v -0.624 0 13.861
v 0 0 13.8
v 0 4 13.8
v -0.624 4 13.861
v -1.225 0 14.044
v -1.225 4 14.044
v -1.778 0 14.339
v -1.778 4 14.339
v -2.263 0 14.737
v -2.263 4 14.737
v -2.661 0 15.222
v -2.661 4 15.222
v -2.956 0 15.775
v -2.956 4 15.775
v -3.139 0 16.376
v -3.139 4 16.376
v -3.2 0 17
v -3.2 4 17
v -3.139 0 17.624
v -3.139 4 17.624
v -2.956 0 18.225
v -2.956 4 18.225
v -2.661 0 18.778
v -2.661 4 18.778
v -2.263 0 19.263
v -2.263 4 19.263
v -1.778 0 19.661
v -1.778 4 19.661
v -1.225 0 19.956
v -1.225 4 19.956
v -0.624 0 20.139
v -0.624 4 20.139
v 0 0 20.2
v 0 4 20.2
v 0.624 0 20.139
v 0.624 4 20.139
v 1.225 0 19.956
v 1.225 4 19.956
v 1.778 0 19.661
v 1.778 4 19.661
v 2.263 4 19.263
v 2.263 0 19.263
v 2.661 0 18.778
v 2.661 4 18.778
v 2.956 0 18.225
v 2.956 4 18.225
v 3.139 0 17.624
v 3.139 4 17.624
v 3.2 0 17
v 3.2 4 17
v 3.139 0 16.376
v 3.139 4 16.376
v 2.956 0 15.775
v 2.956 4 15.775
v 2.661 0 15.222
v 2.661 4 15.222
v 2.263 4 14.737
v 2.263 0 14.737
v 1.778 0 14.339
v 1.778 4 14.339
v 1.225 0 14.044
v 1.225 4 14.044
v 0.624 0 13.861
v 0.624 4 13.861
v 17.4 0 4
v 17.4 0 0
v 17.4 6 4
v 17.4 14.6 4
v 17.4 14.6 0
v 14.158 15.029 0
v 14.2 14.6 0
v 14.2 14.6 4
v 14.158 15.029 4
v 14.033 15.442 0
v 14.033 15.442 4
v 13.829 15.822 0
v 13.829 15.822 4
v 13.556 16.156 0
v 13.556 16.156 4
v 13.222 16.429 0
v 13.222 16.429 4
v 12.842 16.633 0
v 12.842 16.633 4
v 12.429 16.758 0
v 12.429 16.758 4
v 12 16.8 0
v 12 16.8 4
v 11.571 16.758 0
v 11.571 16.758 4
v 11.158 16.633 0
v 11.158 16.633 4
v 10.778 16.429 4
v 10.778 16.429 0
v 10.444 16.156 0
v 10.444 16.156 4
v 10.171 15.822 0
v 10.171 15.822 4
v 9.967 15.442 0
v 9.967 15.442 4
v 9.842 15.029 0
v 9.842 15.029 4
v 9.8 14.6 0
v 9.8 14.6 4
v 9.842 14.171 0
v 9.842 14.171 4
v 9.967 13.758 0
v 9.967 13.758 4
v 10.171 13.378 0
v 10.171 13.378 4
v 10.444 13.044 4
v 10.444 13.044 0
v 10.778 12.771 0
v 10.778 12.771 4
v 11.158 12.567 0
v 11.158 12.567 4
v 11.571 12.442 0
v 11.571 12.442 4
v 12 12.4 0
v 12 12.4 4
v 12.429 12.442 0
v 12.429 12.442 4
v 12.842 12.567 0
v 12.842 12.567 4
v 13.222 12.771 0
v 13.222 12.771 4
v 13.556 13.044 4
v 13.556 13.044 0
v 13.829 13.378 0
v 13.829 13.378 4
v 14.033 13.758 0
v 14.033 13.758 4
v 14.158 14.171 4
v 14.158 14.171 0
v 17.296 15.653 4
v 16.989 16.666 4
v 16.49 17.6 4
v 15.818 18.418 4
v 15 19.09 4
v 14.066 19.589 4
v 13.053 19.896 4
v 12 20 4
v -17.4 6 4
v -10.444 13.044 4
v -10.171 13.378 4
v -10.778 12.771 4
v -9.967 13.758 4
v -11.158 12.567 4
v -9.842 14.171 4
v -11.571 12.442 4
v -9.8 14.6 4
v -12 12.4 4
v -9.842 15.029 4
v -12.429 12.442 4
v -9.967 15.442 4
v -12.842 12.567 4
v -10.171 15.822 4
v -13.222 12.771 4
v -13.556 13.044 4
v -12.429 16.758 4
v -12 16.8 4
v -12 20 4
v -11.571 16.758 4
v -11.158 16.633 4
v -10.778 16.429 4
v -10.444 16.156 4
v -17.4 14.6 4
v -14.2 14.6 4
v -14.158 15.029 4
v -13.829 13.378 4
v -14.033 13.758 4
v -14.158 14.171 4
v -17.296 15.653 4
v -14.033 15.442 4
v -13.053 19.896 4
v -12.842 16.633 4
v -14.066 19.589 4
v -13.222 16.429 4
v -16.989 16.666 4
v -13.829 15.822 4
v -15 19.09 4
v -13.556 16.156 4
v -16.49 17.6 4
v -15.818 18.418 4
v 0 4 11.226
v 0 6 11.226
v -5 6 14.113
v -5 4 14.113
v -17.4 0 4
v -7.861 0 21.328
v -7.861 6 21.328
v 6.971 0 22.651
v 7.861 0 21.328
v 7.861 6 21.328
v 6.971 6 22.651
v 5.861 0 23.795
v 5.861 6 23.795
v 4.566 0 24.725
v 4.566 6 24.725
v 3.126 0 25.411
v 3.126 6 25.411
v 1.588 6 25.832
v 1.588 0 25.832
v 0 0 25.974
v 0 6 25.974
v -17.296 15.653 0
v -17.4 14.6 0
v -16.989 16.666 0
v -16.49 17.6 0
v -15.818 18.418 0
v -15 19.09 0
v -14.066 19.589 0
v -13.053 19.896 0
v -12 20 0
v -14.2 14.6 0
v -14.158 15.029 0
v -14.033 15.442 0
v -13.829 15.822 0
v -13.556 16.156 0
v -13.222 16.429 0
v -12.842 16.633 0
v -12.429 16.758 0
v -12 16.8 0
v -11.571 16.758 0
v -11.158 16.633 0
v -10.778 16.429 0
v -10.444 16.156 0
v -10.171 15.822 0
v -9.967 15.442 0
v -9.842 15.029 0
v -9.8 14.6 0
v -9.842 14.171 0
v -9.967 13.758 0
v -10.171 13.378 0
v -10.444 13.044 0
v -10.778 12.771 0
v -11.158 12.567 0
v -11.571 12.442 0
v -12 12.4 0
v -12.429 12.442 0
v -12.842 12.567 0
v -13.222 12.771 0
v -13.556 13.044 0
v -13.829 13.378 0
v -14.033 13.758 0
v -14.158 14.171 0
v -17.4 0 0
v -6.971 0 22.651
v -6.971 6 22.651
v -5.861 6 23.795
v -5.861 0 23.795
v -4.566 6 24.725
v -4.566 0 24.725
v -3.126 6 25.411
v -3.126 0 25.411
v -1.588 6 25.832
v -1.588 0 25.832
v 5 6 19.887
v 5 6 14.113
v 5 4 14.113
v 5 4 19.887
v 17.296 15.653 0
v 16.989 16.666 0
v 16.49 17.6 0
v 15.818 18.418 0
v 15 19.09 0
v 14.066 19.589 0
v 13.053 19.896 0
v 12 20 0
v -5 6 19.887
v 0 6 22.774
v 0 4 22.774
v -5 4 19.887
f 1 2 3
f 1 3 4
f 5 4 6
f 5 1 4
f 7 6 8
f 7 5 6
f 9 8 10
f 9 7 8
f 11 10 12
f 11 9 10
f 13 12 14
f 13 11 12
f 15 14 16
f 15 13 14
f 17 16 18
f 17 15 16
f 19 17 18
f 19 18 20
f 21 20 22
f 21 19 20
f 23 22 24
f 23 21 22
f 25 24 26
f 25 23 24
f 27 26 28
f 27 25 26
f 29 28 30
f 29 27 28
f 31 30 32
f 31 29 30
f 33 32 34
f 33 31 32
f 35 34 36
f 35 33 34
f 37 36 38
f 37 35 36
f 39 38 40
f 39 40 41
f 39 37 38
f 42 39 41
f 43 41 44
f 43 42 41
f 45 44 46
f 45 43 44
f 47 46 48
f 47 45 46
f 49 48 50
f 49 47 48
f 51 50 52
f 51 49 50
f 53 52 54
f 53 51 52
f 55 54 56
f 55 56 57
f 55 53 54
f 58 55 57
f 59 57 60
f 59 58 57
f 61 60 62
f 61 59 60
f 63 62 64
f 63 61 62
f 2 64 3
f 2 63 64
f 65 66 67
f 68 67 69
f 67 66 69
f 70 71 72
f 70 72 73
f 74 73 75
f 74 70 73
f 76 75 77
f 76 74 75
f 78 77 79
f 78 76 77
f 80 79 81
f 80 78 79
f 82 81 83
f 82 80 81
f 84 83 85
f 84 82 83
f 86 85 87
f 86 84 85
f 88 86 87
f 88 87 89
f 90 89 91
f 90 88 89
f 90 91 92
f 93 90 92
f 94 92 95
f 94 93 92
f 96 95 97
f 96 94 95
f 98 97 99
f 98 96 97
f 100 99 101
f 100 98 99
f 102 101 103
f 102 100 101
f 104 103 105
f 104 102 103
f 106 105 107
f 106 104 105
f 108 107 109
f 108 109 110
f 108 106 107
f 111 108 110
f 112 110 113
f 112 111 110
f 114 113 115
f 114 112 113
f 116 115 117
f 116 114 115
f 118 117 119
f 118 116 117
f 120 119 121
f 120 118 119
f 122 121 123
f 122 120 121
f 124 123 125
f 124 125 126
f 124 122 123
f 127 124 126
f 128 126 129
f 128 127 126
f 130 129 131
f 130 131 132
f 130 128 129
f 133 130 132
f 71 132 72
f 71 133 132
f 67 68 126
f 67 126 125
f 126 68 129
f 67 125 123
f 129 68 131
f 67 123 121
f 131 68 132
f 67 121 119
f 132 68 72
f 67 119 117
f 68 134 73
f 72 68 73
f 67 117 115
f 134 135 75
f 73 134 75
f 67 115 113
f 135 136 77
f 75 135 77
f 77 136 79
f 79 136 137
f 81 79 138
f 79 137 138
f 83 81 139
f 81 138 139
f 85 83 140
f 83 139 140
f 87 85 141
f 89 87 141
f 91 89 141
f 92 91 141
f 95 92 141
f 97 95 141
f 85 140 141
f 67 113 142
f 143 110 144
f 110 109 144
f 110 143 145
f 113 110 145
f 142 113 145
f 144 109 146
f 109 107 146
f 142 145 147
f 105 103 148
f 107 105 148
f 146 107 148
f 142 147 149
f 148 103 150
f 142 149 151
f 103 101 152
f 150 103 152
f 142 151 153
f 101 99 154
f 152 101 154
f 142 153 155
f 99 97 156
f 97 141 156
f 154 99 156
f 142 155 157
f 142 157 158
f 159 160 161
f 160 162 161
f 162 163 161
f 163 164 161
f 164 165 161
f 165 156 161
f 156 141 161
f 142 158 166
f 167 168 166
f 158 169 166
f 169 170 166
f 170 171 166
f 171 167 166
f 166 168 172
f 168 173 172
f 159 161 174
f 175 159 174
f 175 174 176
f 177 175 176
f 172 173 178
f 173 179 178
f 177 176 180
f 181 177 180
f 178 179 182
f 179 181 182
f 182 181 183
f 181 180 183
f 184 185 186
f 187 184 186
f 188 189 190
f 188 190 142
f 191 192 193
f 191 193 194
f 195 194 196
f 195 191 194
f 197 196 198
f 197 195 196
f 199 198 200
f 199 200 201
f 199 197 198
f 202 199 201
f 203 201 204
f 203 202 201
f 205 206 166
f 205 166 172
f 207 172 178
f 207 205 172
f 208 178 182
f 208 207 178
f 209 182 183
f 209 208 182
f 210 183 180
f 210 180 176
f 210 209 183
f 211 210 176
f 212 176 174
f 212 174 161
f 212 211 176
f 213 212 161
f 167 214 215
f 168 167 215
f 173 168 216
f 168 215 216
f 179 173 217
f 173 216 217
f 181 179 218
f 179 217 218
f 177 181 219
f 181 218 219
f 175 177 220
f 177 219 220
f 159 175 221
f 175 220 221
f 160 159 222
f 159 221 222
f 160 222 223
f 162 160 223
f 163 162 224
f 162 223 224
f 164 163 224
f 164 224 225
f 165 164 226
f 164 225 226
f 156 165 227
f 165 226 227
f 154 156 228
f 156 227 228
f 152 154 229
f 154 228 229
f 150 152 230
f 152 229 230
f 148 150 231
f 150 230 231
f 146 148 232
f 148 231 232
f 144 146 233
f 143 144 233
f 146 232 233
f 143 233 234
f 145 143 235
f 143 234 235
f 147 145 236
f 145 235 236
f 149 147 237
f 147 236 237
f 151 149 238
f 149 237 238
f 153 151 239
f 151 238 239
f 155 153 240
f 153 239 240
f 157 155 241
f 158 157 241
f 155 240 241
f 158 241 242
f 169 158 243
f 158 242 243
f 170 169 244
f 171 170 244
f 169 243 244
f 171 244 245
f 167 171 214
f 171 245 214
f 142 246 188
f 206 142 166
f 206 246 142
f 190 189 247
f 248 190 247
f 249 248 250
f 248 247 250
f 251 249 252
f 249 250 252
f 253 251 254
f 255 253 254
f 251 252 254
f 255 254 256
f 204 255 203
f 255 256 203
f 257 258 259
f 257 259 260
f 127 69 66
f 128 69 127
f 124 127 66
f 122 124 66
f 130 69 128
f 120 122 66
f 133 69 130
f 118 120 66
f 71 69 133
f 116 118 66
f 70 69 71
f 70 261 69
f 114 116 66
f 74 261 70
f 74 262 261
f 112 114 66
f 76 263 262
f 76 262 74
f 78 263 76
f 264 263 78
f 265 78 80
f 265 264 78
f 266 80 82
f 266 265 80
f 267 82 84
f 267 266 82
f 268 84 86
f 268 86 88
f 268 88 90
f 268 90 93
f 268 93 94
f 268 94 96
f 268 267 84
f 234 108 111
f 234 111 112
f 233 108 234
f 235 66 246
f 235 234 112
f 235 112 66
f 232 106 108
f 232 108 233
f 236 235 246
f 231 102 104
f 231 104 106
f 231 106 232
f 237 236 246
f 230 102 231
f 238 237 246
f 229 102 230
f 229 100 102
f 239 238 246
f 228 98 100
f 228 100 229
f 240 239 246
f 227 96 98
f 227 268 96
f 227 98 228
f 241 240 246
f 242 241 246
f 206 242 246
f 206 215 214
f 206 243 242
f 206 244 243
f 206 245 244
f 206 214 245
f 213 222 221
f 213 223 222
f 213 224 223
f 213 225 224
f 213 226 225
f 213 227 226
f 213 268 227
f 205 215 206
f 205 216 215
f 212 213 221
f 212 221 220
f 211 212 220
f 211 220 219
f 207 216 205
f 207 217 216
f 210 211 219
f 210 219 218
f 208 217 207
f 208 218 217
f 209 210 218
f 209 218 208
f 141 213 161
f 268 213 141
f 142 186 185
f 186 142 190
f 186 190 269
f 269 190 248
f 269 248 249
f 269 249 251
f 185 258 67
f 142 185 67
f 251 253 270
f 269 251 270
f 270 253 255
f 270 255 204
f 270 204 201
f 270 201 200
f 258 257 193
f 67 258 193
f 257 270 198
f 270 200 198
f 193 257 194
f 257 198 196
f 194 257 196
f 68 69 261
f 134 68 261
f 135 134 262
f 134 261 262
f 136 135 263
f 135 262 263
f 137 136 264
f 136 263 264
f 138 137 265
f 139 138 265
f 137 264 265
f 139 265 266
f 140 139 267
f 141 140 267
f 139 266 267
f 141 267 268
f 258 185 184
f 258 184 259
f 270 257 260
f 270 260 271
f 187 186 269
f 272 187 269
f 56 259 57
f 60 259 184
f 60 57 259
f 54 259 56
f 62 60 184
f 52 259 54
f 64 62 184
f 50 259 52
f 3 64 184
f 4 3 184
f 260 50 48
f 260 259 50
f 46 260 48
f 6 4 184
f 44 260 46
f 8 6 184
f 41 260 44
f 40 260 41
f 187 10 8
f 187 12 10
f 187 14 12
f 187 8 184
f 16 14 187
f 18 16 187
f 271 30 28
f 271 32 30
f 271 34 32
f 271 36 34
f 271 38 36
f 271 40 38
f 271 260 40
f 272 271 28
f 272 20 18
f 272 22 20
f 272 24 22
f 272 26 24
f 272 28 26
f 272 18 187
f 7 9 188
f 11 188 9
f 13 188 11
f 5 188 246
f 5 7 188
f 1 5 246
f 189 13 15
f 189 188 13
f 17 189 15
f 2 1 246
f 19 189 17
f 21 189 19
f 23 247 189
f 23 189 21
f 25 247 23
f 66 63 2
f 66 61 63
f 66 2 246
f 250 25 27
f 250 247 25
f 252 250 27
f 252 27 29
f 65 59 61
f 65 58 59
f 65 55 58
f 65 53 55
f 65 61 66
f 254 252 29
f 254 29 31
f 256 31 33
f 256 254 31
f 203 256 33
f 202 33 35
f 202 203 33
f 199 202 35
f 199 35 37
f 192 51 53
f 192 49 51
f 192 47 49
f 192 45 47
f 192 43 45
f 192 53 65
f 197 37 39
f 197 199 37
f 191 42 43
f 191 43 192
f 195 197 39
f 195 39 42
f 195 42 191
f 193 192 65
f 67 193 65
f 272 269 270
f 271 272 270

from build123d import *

# Parameters (mm, degrees)
SKETCH_R     = 2.2
PAD_DEPTH    = 4
PAD001_DEPTH = 6
POCKET_DEPTH = 2


with BuildPart() as part:
    # Sketch → Pad (new body)
    with BuildSketch(Plane.XY):
        with BuildLine():
            Line((0, 0), (17.4, 0))
            Line((17.4, 0), (17.4, 14.6))
            ThreePointArc((17.4, 14.6), (15.818377, 18.418377), (12, 20))
            Line((12, 20), (0, 20))
            Line((0, 20), (0, 0))
        make_face()
        with Locations((12, 14.6)):
            Circle(SKETCH_R, mode=Mode.SUBTRACT)
    pad = extrude(amount=PAD_DEPTH)

    # Sketch001 → Pad001 (join)
    with BuildSketch(Plane.XZ):
        with BuildLine():
            ThreePointArc((0, 13.8), (3.2, 17), (0, 20.2))
            Line((0, 20.2), (0, 25.973503))
            ThreePointArc((7.861053, 21.327539), (4.565663, 24.725184), (0, 25.973503))
            Line((7.861053, 21.327539), (17.4, 4))
            Line((17.4, 0), (17.4, 4))
            Line((0, 0), (17.4, 0))
            Line((0, 13.8), (0, 0))
        make_face()
    pad001 = extrude(amount=-PAD001_DEPTH)

    # Sketch002 → Pocket (cut)
    with BuildSketch(Plane.XZ.offset(-6)):
        Polygon((0, 22.773503), (-5, 19.886751), (-5, 14.113249), (0, 11.226497), (5, 14.113249), (5, 19.886751), align=None)
    pocket = extrude(amount=POCKET_DEPTH, mode=Mode.SUBTRACT)

    # Mirrored: Pad, Pad001, Pocket across Sketch V_Axis
    add(pad.mirror(Plane(origin=(0, 0, 0), x_dir=(0, 0, 1), z_dir=(1, 0, 0))))
    add(pad001.mirror(Plane(origin=(0, 0, 0), x_dir=(0, 0, 1), z_dir=(1, 0, 0))))
    add(pocket.mirror(Plane(origin=(0, 0, 0), x_dir=(0, 0, 1), z_dir=(1, 0, 0))), mode=Mode.SUBTRACT)


solid = part.part
